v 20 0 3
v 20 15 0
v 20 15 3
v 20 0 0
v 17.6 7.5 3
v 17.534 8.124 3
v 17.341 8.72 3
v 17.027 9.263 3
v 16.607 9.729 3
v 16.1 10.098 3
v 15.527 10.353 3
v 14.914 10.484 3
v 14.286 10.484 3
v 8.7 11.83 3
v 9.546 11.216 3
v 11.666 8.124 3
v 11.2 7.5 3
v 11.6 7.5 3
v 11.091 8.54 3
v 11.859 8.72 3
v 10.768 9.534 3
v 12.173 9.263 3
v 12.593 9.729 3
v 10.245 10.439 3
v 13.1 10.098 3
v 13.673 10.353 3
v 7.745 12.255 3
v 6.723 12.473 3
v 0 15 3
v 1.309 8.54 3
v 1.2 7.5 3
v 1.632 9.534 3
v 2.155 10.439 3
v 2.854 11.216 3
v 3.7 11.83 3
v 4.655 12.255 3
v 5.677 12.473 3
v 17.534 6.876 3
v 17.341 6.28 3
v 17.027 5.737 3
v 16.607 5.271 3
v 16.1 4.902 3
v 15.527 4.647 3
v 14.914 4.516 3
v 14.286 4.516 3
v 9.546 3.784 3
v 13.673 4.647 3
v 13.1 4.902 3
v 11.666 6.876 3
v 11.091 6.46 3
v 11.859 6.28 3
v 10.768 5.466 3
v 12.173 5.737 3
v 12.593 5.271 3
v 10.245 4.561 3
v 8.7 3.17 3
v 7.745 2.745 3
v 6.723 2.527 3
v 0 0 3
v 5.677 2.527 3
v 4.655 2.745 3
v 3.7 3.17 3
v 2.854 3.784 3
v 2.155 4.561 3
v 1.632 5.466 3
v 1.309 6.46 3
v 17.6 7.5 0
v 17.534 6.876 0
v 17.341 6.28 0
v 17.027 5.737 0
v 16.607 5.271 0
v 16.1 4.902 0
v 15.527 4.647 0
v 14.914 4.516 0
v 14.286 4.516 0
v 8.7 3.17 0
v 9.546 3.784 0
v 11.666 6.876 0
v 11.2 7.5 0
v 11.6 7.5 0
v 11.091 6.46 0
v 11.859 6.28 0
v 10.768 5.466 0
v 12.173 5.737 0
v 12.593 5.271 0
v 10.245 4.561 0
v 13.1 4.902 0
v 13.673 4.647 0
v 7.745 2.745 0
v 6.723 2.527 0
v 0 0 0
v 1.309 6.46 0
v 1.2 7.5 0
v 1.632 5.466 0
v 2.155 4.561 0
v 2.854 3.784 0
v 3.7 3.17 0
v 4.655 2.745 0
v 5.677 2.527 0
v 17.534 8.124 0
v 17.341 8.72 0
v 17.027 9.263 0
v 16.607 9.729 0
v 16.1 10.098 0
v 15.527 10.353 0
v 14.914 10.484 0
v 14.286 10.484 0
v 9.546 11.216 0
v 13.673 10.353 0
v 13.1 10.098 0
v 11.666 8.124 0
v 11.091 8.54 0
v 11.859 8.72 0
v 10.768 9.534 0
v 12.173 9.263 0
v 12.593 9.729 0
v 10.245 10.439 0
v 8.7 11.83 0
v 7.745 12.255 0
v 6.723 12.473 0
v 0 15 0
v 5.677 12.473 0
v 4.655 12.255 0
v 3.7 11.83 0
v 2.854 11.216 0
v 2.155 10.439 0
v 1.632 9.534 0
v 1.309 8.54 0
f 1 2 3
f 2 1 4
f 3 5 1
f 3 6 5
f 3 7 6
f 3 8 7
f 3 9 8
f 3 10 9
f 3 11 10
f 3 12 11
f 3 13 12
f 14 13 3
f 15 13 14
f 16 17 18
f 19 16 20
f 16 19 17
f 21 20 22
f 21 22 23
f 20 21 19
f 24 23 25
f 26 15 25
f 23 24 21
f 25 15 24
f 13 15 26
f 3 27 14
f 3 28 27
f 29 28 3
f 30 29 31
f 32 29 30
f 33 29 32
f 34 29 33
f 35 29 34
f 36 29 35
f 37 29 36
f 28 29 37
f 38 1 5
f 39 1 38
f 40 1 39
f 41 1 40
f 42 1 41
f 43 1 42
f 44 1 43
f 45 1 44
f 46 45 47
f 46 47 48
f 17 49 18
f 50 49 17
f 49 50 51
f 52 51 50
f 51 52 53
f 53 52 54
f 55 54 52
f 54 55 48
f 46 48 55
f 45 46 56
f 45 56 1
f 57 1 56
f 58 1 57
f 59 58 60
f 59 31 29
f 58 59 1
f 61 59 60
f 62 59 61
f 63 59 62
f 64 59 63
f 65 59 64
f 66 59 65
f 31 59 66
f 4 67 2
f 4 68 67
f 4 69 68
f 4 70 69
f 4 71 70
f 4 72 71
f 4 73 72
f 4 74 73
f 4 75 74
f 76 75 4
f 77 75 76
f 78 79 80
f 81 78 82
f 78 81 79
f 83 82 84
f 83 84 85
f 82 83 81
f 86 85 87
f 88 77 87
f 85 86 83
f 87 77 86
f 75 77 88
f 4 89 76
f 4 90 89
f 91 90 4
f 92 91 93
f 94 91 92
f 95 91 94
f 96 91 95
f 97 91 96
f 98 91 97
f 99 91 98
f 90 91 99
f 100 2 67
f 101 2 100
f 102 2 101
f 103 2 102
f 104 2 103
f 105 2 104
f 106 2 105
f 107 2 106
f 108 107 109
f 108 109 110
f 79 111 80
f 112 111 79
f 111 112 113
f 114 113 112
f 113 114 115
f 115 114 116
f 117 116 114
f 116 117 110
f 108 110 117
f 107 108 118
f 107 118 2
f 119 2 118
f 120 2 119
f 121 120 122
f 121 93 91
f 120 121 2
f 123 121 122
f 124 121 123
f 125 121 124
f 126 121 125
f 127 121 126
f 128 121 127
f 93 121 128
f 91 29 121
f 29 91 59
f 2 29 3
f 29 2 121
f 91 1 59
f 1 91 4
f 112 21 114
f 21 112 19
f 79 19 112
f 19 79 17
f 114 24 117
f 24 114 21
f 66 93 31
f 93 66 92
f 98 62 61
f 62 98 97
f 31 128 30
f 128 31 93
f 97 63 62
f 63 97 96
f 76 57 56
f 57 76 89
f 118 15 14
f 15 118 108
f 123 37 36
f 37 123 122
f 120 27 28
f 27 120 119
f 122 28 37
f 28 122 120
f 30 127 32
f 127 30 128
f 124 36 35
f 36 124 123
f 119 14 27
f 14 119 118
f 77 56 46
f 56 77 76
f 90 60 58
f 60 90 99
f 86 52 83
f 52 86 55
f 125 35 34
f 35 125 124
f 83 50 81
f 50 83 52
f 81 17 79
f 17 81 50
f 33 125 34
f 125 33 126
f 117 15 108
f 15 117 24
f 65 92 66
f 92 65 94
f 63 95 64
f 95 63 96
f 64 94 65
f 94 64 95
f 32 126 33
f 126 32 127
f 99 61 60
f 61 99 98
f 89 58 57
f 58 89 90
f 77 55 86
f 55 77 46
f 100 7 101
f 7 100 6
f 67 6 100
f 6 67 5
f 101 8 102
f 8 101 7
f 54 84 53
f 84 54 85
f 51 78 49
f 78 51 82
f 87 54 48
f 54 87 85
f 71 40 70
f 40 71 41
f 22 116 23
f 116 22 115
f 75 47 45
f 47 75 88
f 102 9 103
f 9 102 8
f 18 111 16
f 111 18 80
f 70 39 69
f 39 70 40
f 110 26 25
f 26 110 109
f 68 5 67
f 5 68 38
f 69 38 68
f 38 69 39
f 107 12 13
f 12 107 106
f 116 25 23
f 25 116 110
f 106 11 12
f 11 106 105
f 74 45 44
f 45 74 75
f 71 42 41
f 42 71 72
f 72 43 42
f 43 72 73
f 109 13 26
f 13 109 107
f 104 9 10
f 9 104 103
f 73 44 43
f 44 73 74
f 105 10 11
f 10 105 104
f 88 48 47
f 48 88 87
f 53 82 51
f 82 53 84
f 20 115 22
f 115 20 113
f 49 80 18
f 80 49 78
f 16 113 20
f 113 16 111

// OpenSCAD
$fn = 30;
first_distance = 1.2;
first_radius = 5;
second_distance = 0.4;
second_radius = 3;

difference() {
	cube([20, 15, 3]);
	translate([first_distance + first_radius, 7.5, 0])
		cylinder(r=first_radius, h=3);
	translate([first_distance + first_radius * 2 + second_distance + second_radius, 7.5, 0])
		cylinder(r=second_radius, h=3);
}
